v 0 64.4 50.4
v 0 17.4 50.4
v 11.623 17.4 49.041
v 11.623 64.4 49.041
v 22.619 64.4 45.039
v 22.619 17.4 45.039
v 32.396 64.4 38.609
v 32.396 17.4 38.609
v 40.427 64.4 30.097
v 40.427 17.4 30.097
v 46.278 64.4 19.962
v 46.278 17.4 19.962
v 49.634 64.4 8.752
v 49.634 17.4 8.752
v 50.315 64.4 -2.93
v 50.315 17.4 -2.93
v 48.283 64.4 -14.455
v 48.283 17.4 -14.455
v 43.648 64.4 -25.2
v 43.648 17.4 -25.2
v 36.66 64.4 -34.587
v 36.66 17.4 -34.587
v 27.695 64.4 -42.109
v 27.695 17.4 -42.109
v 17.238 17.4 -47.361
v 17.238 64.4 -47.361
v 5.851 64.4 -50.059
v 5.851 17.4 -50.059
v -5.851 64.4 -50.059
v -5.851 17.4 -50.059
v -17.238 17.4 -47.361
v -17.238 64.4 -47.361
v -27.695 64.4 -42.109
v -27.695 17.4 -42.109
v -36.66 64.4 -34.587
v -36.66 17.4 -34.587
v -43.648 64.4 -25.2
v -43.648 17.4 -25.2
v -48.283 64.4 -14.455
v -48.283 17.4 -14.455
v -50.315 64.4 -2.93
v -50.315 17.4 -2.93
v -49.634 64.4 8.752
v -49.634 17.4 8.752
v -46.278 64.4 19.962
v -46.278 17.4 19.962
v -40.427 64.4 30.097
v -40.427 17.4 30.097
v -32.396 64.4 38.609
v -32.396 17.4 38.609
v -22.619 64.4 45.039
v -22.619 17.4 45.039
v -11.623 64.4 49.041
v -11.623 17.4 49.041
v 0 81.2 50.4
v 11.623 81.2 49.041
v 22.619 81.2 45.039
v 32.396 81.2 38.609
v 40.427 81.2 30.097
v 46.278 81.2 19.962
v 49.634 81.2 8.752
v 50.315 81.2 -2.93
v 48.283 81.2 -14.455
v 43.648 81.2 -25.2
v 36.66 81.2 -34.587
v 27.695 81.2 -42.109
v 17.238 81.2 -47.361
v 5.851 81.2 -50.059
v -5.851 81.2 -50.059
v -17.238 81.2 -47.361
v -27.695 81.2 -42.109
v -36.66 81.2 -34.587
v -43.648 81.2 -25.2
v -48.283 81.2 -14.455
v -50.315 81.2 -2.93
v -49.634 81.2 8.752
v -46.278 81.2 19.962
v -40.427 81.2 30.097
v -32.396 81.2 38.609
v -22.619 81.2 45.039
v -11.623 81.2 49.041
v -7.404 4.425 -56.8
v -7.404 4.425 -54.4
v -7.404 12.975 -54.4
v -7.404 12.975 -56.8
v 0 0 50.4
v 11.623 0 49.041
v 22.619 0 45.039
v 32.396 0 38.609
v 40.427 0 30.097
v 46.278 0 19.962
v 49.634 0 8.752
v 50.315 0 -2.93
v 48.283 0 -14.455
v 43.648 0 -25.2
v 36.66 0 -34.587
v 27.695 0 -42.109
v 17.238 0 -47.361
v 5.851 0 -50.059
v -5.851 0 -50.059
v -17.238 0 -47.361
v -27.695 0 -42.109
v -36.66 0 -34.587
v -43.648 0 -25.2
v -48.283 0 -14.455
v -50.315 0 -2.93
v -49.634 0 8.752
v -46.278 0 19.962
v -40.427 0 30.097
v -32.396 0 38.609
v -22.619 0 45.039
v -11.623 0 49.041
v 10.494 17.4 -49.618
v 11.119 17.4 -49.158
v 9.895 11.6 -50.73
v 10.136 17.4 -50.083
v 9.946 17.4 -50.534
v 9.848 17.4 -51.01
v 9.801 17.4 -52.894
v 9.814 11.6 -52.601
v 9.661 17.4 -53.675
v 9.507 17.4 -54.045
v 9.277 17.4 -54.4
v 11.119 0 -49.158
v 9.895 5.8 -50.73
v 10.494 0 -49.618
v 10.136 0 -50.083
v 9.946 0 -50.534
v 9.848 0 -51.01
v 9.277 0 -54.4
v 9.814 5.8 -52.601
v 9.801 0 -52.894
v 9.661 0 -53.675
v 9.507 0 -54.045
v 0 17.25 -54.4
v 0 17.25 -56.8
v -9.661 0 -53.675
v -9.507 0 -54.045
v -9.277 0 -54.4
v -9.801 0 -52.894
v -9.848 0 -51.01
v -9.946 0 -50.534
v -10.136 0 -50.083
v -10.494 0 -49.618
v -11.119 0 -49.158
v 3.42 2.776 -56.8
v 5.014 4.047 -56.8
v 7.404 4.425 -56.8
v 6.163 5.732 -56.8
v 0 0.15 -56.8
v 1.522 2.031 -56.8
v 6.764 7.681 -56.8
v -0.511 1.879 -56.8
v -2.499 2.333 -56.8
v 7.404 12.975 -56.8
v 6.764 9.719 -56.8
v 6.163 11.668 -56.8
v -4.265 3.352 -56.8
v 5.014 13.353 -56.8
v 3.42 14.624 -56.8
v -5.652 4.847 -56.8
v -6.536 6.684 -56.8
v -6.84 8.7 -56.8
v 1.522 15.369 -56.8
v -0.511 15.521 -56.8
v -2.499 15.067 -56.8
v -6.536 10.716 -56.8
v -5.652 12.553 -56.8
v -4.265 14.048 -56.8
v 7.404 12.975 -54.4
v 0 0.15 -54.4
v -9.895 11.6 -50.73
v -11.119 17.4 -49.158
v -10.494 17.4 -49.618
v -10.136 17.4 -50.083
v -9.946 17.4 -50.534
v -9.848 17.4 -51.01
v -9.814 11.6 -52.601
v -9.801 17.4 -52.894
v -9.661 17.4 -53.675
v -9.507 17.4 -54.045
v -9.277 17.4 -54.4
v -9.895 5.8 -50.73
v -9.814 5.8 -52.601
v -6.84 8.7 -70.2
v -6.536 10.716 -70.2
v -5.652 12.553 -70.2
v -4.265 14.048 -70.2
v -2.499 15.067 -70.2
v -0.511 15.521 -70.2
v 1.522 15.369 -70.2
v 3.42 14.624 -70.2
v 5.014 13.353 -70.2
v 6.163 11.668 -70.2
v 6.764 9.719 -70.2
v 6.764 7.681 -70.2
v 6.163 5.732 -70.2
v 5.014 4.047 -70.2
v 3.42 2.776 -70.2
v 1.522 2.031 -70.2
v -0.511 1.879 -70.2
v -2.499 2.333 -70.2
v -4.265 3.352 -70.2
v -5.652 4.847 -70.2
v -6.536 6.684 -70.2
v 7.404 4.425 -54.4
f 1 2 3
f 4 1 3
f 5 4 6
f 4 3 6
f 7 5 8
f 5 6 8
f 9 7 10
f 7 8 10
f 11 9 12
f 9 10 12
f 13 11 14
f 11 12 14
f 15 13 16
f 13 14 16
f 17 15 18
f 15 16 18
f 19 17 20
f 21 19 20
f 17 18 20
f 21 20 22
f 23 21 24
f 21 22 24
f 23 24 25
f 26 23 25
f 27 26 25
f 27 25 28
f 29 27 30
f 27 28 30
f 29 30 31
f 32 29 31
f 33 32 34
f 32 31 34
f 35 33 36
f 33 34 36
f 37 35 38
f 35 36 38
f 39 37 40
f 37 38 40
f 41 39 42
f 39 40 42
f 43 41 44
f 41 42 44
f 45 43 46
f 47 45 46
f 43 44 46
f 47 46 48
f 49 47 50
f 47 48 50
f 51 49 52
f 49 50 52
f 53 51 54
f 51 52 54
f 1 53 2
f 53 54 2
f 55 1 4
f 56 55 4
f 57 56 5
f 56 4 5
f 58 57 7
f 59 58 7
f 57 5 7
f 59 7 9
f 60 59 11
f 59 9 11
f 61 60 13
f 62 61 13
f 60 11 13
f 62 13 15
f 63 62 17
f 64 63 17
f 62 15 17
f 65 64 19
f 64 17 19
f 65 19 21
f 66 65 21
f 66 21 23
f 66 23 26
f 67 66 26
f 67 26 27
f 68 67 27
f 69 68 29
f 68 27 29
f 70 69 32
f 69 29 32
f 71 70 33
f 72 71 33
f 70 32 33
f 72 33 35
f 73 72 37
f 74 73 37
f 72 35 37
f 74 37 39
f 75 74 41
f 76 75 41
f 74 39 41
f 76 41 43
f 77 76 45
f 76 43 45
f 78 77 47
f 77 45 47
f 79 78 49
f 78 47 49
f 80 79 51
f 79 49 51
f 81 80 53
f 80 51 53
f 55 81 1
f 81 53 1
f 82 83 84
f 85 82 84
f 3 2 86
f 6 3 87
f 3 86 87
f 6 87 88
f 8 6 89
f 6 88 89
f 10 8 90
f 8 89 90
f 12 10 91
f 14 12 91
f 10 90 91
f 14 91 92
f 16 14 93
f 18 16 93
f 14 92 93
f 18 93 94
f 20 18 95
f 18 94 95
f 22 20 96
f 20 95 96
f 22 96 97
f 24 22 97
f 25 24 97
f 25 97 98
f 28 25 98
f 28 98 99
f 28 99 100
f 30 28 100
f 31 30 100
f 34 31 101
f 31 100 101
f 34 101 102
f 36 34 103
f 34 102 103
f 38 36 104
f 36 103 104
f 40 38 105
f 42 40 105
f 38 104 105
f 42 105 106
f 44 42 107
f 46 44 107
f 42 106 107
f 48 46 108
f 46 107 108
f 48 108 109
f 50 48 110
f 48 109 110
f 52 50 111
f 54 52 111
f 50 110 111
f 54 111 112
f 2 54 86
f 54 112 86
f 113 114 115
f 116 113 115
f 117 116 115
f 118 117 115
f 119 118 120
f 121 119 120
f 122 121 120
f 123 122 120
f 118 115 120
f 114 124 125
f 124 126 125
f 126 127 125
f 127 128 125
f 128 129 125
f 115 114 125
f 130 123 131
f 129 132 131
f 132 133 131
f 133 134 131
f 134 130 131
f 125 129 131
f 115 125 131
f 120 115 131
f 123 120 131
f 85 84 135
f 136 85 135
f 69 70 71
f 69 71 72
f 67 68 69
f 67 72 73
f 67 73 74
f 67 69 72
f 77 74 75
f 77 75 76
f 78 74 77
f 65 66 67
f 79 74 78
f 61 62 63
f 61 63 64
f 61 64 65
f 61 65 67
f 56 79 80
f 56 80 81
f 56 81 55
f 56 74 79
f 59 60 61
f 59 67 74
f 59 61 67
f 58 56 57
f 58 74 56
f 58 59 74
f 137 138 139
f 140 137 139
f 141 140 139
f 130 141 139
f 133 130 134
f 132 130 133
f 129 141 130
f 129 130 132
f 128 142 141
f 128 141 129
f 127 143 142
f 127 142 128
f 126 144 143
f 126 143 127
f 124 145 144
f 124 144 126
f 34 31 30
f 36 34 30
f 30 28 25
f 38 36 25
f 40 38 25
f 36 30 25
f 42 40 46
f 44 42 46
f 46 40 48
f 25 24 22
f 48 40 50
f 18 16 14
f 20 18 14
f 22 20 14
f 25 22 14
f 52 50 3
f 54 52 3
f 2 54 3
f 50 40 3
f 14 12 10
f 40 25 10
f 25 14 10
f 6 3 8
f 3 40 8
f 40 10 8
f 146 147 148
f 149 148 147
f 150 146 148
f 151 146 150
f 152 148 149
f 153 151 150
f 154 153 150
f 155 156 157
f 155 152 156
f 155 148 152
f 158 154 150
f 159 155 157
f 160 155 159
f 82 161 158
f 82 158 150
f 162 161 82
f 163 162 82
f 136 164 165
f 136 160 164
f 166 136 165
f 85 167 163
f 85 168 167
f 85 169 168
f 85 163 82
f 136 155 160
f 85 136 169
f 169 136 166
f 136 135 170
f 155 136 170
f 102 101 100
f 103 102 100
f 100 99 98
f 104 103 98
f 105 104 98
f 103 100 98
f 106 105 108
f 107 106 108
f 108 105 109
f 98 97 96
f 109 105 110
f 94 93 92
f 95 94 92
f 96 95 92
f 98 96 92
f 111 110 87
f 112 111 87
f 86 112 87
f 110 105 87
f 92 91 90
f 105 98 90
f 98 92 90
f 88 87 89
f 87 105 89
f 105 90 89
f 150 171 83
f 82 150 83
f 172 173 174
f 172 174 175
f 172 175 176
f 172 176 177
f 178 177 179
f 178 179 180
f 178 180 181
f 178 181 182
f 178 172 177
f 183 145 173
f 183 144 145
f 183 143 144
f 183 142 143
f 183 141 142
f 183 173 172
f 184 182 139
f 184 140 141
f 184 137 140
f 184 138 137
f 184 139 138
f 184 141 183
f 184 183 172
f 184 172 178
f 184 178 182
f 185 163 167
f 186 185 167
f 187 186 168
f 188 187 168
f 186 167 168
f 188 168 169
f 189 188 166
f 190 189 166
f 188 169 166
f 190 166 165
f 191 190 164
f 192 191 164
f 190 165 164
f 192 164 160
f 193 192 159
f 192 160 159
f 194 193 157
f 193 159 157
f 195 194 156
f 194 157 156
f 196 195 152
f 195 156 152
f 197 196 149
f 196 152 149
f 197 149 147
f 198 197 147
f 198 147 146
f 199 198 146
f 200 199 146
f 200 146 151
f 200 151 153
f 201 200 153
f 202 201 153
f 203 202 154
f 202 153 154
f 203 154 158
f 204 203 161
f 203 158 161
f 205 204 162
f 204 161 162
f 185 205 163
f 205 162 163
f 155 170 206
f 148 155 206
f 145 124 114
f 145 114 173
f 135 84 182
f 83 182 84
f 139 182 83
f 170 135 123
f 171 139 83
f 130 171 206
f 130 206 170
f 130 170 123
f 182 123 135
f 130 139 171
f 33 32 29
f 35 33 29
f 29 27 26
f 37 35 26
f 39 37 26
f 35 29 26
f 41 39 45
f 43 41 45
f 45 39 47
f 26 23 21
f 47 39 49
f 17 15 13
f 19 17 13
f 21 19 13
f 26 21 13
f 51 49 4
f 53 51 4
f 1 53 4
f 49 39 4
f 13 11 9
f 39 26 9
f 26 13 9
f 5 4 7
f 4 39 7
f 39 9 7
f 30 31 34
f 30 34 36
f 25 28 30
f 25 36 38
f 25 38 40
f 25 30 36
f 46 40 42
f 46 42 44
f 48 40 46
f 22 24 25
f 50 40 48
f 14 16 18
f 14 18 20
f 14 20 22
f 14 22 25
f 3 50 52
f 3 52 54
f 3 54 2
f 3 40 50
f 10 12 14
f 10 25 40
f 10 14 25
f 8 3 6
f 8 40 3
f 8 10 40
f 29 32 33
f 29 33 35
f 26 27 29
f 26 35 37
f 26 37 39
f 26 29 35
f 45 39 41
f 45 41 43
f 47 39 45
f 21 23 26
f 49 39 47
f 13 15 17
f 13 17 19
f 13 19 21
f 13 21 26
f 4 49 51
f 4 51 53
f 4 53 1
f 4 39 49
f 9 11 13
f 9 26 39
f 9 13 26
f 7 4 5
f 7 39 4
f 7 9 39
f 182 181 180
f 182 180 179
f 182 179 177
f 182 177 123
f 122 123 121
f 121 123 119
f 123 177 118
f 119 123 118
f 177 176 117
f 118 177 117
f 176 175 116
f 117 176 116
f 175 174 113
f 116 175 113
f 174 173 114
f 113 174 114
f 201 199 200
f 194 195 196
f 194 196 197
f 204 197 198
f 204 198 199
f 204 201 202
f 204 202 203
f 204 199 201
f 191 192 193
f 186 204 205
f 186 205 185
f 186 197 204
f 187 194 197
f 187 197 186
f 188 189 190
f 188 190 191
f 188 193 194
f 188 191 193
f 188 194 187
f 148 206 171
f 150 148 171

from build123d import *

# Parameters (mm, degrees)
SKETCH1_R           = 50.4
BOSS_EXTRUDE1_DEPTH = 17.4
SKETCH2_R           = 50.4
BOSS_EXTRUDE4_DEPTH = 47
SKETCH3_R           = 50.4
BOSS_EXTRUDE5_DEPTH = 16.8
BOSS_EXTRUDE7_DEPTH = 17.4
BOSS_EXTRUDE8_DEPTH = 2.4
SKETCH7_R           = 6.840256055
BOSS_EXTRUDE9_DEPTH = 13.4


with BuildPart() as part:
    # Sketch1 → Boss-Extrude1 (new body)
    with BuildSketch(Plane(origin=(0, 0, 0), x_dir=(1, 0, 0), z_dir=(0, 1, 0))):
        with Locations(Location((0, 0, 0), (0, 0, 270))):
            Circle(SKETCH1_R)
    extrude(amount=BOSS_EXTRUDE1_DEPTH)


with BuildPart() as body_2:
    # Sketch2 → Boss-Extrude4 (new body)
    with BuildSketch(Plane(origin=(0, 17.4, 0), x_dir=(1, 0, 0), z_dir=(0, 1, 0))):
        with Locations(Location((0, 0, 0), (0, 0, 270))):
            Circle(SKETCH2_R)
    extrude(amount=BOSS_EXTRUDE4_DEPTH)


with BuildPart() as body_3:
    # Sketch3 → Boss-Extrude5 (new body)
    with BuildSketch(Plane(origin=(0, 64.4, 0), x_dir=(1, 0, 0), z_dir=(0, 1, 0))):
        with Locations(Location((0, 0, 0), (0, 0, 270))):
            Circle(SKETCH3_R)
    extrude(amount=BOSS_EXTRUDE5_DEPTH)


with BuildPart() as body_4:
    # Sketch5 → Boss-Extrude7 (new body)
    with BuildSketch(Plane.XZ):
        with BuildLine():
            Line((-9.276969029, -54.4), (9.276969029, -54.4))
            add(Edge.make_bspline(
                [(11.118948593, -49.15820361), (8.792277398, -50.457107312), (10.573380416, -52.761094985), (9.276969029, -54.4)],
                knots=[0, 0, 0, 0, 1, 1, 1, 1], degree=3))
            Line((11.118948593, -49.15820361), (-11.118948593, -49.15820361))
            add(Edge.make_bspline(
                [(-11.118948593, -49.15820361), (-8.792277398, -50.457107312), (-10.573380416, -52.761094985), (-9.276969029, -54.4)],
                knots=[0, 0, 0, 0, 1, 1, 1, 1], degree=3))
        make_face()
    extrude(amount=-BOSS_EXTRUDE7_DEPTH)

    # Sketch6 → Boss-Extrude8 (add)
    with BuildSketch(Plane(origin=(0, 0, -54.4), x_dir=(-1, 0, 0), z_dir=(0, 0, -1))):
        Polygon((0, 17.249859203), (-7.404395268, 12.974929601), (-7.404395268, 4.425070399), (0, 0.150140797), (7.404395268, 4.425070399), (7.404395268, 12.974929601), align=None)
    extrude(amount=BOSS_EXTRUDE8_DEPTH)

    # Sketch7 → Boss-Extrude9 (add)
    with BuildSketch(Plane(origin=(0, 0, -56.8), x_dir=(-1, 0, 0), z_dir=(0, 0, -1))):
        with Locations((0, 8.7)):
            Circle(SKETCH7_R)
    extrude(amount=BOSS_EXTRUDE9_DEPTH)


solid = Compound([part.part, body_2.part, body_3.part, body_4.part])
